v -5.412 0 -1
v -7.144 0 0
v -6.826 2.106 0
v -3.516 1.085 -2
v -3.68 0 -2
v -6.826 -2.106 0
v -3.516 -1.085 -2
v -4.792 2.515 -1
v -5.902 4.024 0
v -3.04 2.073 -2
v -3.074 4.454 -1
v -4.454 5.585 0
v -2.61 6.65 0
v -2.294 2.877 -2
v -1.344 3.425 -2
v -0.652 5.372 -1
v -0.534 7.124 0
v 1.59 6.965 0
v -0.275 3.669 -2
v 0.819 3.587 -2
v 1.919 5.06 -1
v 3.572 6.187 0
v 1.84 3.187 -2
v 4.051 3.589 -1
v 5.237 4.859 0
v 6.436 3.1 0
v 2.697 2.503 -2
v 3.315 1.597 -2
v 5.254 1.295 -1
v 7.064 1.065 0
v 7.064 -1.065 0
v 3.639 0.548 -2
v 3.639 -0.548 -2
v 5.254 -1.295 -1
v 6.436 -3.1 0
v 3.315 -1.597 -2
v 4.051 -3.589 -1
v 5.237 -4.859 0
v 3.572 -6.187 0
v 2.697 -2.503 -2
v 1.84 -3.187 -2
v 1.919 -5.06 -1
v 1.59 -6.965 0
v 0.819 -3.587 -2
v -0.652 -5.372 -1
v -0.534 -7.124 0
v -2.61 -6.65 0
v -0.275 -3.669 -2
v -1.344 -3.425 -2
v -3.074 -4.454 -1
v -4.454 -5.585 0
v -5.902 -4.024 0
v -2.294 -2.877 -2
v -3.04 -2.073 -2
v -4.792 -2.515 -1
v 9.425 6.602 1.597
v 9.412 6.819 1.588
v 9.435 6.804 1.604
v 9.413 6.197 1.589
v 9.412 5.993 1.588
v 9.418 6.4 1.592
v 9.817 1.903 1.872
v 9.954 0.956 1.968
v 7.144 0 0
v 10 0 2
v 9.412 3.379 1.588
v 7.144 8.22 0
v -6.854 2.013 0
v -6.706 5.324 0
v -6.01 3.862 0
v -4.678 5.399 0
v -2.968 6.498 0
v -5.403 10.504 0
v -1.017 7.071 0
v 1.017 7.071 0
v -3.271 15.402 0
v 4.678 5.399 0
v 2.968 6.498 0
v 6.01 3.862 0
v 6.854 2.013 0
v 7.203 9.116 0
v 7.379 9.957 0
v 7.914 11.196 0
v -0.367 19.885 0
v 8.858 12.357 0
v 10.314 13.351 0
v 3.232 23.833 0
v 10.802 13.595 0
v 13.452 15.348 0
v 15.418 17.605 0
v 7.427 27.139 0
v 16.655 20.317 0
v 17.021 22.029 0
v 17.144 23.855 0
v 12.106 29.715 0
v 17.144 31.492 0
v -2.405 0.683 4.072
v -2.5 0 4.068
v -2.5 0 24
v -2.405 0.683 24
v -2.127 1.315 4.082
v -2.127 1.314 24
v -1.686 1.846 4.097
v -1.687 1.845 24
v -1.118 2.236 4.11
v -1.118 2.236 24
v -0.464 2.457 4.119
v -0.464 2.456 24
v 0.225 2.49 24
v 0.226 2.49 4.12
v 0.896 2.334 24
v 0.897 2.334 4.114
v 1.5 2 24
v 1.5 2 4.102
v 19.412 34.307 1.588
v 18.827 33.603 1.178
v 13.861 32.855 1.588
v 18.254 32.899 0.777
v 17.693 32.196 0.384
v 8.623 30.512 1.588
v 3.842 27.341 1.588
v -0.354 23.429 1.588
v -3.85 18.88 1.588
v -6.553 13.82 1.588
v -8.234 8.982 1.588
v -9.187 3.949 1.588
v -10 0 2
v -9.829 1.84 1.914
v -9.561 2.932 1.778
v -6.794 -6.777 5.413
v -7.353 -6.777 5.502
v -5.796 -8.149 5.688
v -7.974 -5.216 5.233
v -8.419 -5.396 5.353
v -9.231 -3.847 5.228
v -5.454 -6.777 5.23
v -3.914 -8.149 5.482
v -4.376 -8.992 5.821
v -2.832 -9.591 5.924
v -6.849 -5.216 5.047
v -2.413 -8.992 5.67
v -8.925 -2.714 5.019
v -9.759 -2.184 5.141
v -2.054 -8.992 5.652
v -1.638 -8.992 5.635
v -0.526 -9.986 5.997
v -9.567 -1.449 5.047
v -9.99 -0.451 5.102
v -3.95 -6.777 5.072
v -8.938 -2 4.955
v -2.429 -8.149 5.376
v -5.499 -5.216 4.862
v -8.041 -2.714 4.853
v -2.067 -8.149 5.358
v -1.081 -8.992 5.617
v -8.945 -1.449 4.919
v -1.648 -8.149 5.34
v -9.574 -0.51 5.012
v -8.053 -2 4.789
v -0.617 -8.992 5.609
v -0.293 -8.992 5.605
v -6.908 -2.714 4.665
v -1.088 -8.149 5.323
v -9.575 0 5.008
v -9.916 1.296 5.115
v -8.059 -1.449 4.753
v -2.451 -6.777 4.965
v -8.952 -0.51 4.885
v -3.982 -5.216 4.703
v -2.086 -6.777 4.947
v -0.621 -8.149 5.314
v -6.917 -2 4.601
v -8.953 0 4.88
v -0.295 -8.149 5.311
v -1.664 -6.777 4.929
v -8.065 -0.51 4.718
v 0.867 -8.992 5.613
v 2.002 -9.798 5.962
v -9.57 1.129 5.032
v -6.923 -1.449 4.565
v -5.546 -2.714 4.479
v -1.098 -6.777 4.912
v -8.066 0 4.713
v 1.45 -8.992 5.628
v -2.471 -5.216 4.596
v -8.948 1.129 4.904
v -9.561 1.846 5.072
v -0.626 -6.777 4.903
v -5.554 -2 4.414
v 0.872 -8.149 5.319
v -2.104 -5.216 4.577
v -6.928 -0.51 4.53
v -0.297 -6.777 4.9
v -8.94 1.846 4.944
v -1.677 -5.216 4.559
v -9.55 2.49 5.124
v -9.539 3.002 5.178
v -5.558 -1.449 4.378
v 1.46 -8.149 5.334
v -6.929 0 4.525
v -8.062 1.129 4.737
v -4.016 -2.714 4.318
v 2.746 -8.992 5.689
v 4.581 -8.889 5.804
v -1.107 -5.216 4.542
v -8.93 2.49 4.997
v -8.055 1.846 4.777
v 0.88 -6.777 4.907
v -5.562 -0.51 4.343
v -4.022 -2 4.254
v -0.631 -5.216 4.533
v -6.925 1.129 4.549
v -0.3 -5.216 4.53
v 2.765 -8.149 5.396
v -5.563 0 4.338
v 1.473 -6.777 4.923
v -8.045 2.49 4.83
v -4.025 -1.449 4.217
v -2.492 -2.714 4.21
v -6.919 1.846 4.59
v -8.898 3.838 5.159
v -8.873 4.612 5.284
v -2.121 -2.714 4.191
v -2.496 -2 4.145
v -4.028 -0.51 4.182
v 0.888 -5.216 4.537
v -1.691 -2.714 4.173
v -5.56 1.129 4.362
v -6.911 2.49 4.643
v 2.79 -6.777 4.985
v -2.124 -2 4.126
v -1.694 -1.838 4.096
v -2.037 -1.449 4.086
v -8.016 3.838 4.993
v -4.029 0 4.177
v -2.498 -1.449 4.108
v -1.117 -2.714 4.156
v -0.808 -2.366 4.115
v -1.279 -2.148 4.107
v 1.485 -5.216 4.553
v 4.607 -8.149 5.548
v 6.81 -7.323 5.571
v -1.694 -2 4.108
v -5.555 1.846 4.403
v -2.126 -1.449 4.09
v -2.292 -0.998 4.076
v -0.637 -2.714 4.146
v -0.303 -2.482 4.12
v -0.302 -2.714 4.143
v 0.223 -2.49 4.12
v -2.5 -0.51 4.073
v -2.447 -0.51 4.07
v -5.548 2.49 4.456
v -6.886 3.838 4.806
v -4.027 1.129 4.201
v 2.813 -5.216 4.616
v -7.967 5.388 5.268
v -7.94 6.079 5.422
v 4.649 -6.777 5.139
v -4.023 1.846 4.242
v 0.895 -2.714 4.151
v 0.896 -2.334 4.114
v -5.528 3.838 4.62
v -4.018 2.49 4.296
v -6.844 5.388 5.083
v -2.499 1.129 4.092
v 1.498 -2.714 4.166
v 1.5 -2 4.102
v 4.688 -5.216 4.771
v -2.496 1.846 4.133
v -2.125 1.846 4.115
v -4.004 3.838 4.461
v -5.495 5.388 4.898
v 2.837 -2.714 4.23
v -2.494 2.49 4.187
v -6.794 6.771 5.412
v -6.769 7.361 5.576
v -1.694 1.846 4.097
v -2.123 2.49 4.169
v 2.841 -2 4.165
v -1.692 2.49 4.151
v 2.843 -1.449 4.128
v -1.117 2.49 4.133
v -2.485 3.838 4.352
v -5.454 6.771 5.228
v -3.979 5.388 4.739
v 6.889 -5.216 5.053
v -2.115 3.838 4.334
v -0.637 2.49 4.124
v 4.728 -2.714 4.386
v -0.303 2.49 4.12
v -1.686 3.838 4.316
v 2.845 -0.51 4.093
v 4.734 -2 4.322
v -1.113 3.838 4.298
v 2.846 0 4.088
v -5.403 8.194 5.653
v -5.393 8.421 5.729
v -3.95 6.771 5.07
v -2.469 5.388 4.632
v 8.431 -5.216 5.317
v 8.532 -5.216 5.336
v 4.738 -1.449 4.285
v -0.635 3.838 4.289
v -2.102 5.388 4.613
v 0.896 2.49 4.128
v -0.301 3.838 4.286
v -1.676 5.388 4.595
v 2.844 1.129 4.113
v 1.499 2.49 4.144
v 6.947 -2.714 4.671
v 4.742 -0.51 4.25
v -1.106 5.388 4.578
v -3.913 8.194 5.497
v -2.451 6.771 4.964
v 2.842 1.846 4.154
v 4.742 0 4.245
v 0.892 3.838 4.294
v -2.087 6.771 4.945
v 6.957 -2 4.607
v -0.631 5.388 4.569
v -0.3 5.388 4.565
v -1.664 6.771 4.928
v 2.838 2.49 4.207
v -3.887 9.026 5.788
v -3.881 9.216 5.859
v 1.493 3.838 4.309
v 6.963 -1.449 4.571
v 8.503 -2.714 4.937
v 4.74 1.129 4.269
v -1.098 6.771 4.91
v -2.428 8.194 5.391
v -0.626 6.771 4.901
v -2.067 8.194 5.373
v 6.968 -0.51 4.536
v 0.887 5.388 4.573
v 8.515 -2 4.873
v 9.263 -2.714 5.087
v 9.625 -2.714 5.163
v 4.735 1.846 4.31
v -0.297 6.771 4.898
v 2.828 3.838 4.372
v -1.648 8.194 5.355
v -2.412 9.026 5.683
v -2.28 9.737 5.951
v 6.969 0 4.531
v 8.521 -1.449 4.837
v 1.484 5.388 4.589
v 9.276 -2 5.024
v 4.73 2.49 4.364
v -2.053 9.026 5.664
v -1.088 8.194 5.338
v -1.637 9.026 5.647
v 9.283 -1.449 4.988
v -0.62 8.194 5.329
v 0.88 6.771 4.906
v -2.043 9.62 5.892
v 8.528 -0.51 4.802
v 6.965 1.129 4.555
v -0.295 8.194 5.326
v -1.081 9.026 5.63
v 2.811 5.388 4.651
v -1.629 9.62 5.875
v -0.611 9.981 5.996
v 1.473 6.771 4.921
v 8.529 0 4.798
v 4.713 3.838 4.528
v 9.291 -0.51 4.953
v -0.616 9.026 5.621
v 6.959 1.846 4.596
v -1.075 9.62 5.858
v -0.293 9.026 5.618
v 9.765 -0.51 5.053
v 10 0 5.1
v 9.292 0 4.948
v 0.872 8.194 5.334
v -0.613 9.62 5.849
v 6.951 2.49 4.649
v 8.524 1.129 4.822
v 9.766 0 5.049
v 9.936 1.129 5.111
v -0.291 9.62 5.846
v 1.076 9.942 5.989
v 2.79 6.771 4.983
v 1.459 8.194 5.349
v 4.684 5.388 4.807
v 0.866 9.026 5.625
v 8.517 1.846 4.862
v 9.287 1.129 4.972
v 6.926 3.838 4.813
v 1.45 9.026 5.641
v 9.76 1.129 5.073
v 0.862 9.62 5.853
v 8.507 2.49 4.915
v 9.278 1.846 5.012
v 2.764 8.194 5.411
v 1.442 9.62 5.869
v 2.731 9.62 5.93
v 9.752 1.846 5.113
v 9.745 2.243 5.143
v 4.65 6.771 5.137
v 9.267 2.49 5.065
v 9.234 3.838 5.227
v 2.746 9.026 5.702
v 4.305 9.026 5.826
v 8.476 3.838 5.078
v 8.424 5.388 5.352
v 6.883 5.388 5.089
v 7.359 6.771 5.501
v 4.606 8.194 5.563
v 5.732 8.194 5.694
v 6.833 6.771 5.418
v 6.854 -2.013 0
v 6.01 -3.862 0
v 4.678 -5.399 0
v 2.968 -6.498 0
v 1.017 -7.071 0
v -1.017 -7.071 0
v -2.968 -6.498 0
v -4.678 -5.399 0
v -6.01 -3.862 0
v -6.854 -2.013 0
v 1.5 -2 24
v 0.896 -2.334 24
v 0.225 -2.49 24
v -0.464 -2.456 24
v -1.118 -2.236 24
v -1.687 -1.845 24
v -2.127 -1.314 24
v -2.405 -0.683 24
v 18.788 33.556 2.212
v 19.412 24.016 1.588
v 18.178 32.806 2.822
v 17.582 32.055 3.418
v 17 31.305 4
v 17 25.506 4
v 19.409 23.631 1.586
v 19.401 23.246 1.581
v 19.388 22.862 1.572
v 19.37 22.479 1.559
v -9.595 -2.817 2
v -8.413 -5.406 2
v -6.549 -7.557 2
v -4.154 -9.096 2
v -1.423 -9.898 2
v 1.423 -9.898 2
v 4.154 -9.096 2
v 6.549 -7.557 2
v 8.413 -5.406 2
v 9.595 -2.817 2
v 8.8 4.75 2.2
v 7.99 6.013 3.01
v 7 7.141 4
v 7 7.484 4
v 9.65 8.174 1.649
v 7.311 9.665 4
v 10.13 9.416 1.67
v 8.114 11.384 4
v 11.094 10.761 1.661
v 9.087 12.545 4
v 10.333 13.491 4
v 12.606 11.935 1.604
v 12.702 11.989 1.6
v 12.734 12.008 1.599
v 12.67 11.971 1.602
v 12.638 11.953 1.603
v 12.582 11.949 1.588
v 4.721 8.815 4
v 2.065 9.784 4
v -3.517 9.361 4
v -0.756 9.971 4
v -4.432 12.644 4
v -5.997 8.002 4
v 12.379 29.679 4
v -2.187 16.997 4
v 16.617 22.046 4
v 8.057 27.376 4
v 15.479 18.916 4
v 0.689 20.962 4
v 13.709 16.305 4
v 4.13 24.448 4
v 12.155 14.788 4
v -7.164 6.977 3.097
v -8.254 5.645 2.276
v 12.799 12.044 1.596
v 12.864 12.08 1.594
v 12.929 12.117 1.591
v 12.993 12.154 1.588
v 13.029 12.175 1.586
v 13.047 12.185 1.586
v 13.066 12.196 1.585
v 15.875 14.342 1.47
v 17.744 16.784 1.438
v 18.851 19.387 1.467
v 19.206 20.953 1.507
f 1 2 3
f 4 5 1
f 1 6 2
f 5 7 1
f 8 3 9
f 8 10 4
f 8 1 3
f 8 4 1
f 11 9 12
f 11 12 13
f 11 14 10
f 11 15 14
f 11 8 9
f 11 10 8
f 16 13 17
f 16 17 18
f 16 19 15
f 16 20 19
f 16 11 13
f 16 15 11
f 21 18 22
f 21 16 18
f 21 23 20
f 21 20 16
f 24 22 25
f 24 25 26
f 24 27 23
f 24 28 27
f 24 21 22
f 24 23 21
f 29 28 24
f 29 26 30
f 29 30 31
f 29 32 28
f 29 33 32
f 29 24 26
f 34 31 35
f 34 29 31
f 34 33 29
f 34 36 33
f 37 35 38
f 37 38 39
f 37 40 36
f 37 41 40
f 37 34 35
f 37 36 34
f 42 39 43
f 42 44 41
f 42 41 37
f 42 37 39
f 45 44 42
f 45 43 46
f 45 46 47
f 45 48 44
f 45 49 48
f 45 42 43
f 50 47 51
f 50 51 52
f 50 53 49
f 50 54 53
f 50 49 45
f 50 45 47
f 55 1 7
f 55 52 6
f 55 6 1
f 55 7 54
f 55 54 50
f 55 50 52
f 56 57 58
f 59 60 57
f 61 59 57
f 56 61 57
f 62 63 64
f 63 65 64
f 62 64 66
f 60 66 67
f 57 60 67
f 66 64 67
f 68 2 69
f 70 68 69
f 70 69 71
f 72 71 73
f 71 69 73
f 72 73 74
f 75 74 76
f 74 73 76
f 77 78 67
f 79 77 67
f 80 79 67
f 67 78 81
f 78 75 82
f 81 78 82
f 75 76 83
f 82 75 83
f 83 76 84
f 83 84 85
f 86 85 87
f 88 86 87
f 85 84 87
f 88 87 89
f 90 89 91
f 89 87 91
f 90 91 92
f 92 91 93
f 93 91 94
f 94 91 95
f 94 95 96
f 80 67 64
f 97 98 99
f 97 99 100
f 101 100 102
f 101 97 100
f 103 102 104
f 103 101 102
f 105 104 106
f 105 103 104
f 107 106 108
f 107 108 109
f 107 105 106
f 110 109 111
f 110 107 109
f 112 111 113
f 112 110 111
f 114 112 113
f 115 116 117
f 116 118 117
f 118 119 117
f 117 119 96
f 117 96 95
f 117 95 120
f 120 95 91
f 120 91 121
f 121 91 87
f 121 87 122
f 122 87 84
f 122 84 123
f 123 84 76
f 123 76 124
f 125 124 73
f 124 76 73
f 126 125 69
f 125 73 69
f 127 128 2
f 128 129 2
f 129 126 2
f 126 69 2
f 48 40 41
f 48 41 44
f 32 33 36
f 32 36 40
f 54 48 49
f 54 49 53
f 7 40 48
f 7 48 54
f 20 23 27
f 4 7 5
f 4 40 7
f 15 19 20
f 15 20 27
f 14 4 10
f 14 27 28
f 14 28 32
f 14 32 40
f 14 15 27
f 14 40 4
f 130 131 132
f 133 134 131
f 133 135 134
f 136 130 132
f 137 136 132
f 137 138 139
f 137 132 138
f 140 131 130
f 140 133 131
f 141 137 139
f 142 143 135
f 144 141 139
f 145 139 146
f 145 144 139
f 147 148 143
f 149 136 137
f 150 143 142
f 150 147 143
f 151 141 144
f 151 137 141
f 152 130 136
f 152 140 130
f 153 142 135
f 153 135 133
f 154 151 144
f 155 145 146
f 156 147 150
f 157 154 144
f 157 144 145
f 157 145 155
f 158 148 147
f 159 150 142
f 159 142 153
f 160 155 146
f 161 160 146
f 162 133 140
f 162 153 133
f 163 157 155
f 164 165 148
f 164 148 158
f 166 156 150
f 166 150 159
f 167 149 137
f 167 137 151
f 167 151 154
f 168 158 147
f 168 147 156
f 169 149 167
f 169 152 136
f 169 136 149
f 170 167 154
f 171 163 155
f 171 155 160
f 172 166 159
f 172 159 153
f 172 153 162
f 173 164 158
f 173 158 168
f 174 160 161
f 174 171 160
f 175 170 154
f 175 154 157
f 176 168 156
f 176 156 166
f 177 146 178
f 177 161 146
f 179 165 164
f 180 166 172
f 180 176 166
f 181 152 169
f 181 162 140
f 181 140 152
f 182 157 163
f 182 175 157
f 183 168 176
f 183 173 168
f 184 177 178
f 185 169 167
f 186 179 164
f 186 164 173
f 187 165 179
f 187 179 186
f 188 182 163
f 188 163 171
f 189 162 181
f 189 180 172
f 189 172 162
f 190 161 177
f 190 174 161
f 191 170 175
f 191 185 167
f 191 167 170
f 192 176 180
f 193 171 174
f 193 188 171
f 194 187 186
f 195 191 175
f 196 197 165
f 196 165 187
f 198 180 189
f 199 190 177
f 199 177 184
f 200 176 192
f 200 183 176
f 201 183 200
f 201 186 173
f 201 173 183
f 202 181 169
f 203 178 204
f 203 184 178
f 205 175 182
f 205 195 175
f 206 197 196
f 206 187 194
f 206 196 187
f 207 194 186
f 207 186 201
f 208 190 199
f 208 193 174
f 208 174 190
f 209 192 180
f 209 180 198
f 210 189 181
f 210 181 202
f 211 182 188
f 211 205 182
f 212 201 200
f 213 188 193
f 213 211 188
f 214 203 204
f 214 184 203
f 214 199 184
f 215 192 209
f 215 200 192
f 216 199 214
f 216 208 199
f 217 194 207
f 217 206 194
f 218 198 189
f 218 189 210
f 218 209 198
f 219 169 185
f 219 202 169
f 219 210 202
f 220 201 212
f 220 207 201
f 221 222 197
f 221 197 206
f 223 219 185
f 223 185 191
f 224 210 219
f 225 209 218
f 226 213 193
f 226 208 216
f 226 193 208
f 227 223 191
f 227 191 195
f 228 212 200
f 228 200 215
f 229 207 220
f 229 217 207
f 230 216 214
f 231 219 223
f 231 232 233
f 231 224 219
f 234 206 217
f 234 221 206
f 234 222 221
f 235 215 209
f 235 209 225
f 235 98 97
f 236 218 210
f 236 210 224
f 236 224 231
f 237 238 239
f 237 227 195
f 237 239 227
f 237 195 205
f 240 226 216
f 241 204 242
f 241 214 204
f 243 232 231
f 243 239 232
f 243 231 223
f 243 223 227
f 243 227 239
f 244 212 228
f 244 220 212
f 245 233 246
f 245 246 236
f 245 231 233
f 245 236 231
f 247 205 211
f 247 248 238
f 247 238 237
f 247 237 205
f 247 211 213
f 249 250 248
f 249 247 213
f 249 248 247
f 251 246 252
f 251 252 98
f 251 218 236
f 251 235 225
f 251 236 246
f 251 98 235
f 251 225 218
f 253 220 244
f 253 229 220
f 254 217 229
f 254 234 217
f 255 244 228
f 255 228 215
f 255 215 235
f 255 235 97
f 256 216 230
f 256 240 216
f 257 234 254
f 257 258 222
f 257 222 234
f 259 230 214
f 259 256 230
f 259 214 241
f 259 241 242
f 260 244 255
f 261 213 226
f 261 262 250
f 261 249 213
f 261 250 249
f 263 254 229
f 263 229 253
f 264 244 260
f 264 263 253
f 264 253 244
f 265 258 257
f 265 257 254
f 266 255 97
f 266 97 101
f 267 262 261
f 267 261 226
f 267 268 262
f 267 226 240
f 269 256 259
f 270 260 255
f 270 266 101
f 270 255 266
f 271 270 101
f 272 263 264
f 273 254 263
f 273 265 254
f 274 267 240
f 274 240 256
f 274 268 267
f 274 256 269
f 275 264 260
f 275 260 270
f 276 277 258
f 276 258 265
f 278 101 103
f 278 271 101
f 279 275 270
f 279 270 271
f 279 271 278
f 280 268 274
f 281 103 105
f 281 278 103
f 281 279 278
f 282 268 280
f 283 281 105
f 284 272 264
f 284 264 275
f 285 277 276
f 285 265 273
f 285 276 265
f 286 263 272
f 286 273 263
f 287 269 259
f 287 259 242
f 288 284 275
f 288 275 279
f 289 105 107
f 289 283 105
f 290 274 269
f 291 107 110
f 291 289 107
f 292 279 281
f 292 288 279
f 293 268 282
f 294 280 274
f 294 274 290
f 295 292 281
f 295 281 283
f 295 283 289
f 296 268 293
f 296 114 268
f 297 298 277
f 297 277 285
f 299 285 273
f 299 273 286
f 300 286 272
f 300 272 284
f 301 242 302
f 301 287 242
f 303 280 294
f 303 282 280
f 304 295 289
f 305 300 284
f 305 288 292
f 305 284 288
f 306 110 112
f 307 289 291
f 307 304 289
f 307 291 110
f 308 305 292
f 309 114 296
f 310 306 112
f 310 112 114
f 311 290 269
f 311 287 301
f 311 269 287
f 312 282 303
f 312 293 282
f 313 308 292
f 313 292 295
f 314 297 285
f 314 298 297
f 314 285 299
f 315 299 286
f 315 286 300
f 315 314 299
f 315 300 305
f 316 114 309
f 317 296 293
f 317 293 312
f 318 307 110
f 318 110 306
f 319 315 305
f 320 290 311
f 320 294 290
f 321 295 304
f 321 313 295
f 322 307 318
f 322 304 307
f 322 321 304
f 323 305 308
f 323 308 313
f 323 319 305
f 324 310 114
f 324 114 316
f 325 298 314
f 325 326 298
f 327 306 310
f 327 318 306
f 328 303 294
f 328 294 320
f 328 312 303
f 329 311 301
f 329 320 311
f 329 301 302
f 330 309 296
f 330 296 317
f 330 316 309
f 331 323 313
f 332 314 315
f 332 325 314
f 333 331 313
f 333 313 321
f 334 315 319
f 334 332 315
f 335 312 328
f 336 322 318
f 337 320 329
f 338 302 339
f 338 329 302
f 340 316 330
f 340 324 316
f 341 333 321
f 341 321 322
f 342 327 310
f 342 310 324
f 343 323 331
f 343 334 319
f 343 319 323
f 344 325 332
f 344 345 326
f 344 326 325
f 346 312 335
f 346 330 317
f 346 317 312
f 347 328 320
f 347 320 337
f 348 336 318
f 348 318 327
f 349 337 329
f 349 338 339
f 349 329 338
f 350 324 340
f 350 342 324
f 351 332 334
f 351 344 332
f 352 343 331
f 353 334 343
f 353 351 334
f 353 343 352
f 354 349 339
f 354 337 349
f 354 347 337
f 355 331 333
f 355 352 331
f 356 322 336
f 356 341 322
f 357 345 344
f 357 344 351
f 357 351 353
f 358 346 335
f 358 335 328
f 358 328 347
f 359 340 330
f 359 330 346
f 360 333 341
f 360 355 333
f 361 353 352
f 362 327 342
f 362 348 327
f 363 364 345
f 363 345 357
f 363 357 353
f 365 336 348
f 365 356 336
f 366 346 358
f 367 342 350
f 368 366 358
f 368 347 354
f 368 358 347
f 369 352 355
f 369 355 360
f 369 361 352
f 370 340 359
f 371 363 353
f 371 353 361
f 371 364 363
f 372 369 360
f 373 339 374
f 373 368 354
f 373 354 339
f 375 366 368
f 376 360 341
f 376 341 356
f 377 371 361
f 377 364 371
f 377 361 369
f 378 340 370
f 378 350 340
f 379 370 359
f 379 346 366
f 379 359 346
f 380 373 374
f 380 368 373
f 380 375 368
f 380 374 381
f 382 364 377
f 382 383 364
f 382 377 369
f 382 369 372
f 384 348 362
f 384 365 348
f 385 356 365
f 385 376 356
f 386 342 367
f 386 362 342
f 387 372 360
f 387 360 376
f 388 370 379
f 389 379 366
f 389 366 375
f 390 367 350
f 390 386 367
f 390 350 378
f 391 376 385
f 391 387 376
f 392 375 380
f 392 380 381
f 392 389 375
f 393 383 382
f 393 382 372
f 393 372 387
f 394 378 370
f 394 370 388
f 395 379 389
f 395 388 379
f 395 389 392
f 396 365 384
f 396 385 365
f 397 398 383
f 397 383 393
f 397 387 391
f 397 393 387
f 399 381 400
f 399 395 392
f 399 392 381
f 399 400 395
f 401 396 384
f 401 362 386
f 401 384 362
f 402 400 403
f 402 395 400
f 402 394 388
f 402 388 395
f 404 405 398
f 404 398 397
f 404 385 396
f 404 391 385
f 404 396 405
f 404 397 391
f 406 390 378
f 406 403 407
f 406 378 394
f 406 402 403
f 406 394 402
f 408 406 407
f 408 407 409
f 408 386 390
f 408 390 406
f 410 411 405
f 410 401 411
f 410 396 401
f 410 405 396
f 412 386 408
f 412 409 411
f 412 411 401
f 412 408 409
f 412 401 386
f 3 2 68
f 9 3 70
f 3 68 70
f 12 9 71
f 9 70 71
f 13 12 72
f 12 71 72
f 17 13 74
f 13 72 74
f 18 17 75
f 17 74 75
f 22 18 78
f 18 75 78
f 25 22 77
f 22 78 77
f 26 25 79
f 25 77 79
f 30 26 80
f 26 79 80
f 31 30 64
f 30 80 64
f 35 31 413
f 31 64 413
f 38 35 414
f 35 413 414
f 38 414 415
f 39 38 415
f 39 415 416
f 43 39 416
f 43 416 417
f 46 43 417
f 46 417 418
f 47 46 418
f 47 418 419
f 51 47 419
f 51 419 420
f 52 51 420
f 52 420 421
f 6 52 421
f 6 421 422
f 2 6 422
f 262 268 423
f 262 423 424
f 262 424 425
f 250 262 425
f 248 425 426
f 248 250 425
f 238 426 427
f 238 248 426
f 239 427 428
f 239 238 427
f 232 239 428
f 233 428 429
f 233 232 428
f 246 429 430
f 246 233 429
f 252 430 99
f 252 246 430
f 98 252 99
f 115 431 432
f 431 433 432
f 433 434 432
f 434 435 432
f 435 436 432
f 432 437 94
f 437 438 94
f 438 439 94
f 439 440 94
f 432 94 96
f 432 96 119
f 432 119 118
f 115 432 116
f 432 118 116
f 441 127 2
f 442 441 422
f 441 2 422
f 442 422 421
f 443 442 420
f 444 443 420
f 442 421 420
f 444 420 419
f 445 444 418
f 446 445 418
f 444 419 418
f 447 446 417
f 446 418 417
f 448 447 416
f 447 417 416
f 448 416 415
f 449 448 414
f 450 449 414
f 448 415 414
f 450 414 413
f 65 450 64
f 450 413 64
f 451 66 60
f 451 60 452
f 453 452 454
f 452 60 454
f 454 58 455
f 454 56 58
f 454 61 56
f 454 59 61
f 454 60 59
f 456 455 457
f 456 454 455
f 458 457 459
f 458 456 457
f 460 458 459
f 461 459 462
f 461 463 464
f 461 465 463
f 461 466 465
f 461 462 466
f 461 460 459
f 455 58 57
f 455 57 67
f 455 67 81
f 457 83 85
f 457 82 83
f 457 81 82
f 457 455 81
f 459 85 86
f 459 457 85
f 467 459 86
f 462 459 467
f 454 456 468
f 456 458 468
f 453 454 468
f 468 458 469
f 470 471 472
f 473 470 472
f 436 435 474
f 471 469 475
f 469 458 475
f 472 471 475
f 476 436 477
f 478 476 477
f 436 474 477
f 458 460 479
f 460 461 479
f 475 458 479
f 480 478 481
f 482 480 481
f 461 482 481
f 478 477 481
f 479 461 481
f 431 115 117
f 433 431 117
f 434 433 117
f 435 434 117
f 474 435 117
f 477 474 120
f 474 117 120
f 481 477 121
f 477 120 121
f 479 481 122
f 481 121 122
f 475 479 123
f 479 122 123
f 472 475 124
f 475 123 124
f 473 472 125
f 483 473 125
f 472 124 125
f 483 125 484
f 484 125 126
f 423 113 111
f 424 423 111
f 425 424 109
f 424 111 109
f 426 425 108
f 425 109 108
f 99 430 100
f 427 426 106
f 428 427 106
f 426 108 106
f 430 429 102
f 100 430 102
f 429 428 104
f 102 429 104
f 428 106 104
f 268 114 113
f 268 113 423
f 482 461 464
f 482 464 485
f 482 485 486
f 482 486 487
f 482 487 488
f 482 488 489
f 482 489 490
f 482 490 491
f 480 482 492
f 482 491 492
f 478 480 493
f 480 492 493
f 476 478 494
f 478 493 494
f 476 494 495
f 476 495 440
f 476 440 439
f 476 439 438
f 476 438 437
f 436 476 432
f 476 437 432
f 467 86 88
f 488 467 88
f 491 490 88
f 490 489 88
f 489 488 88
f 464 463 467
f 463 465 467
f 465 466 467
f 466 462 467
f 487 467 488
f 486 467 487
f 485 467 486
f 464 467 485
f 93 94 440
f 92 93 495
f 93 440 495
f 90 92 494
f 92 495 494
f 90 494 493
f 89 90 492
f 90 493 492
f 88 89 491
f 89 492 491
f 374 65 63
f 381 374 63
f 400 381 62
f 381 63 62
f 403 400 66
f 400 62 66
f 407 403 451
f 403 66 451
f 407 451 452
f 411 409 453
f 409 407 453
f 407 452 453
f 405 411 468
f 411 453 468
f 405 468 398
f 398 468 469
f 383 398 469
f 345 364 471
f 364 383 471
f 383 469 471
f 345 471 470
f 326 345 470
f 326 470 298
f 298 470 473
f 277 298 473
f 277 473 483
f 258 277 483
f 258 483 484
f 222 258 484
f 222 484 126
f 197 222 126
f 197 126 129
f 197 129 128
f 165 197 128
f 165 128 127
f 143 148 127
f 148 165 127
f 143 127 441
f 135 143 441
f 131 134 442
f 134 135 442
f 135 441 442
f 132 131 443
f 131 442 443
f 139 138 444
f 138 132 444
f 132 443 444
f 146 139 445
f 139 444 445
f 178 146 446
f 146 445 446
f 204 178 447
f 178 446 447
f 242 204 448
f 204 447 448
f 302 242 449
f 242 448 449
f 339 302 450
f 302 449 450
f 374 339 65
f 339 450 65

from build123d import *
from OCP.BRepFilletAPI import BRepFilletAPI_MakeChamfer
from build123d.topology import SkipClean

# Parameters (mm, degrees)
SKETCH1_R           = 10
BOSS_EXTRUDE1_DEPTH = 4
CHAMFER1_SIZE       = 2
CHAMFER1_SIZE2      = 2.856296013
SKETCH3_R           = 10
BOSS_EXTRUDE2_DEPTH = 2
CHAMFER2_SIZE       = 3
BOSS_EXTRUDE3_DEPTH = 24
SKETCH6_R           = 7.143703987
BOSS_EXTRUDE4_DEPTH = 2
CHAMFER3_SIZE2      = 3.464101615
CHAMFER3_SIZE       = 2
FILLET1_R           = 10
FILLET2_R           = 20


# Some blends are built 0.0001 mm under size
with BuildPart() as part:
    # Sketch1 → Boss-Extrude1 (new body)
    with BuildSketch(Plane.XY):
        with BuildLine():
            ThreePointArc((-10, 0), (0, 10), (10, 0))
            Line((10, 0), (10, 10))
            Line((10, 10), (20, 15))
            Line((20, 15), (20, 35))
            ThreePointArc((20, 35), (-1.473671334, 23.048861143), (-10, 0))
        make_face()
        Circle(SKETCH1_R)
    extrude(amount=BOSS_EXTRUDE1_DEPTH)

    # Chamfer1: one chamfer whose edges measure the first distance from different faces: ONE call of the kernel's chamfer builder (chamfer() names one face for all edges)
    chamfer1_edges_1 = [part.edges().sort_by_distance(p)[0] for p in [
        (20, 25, 0),
    ]]
    chamfer1_side_1 = [part.faces().sort_by_distance(p)[0] for p in [
        (20, 25, 2),
    ]]
    chamfer1_edges_2 = [part.edges().sort_by_distance(p)[0] for p in [
        (15, 12.5, 0),
    ]]
    chamfer1_side_2 = [part.faces().sort_by_distance(p)[0] for p in [
        (15, 12.5, 2),
    ]]
    chamfer1_edges_3 = [part.edges().sort_by_distance(p)[0] for p in [
        (10, 5, 0),
    ]]
    chamfer1_side_3 = [part.faces().sort_by_distance(p)[0] for p in [
        (10, 5, 2),
    ]]
    chamfer1_edges_4 = [part.edges().sort_by_distance(p)[0] for p in [
        (0, -10, 0),
    ]]
    chamfer1_side_4 = [part.faces().sort_by_distance(p)[0] for p in [
        (0, -10, 2),
    ]]
    chamfer1_edges_5 = [part.edges().sort_by_distance(p)[0] for p in [
        (-1.473671334, 23.048861143, 0),
    ]]
    chamfer1_side_5 = [part.faces().sort_by_distance(p)[0] for p in [
        (-1.473671334, 23.048861143, 2),
    ]]
    chamfer1 = BRepFilletAPI_MakeChamfer(part.part.solid().wrapped)
    for e in chamfer1_edges_1:
        chamfer1.Add(CHAMFER1_SIZE, CHAMFER1_SIZE2, e.wrapped, chamfer1_side_1[0].wrapped)  # the first distance lies on this face
    for e in chamfer1_edges_2:
        chamfer1.Add(CHAMFER1_SIZE, CHAMFER1_SIZE2, e.wrapped, chamfer1_side_2[0].wrapped)  # the first distance lies on this face
    for e in chamfer1_edges_3:
        chamfer1.Add(CHAMFER1_SIZE, CHAMFER1_SIZE2, e.wrapped, chamfer1_side_3[0].wrapped)  # the first distance lies on this face
    for e in chamfer1_edges_4:
        chamfer1.Add(CHAMFER1_SIZE, CHAMFER1_SIZE2, e.wrapped, chamfer1_side_4[0].wrapped)  # the first distance lies on this face
    for e in chamfer1_edges_5:
        chamfer1.Add(CHAMFER1_SIZE, CHAMFER1_SIZE2, e.wrapped, chamfer1_side_5[0].wrapped)  # the first distance lies on this face
    add(Compound.cast(chamfer1.Shape()), mode=Mode.REPLACE)

    # Sketch3 → Boss-Extrude2 (add)
    with BuildSketch(Plane.XY.offset(4)):
        Circle(SKETCH3_R)
    extrude(amount=BOSS_EXTRUDE2_DEPTH)

    # Sketch4 → Cut-Revolve2 (revolve, cut)
    with SkipClean():  # the faces are left unmerged after this step: merging them gives an invalid solid
        with BuildSketch(Plane(origin=(0, 0, 0), x_dir=(0, 0, -1), z_dir=(1, 0, 0))):
            with BuildLine():
                Line((-50, 16.613247726), (-50, -16.613247726))
                ThreePointArc((-50, -16.613247726), (-4, 0), (-50, 16.613247726))
            make_face()
        revolve(axis=Axis((0, 16.613247726, 50), (0, -1, 0)), mode=Mode.SUBTRACT)

    # Chamfer2
    # the kernel refuses this chamfer: 3 mm, written as the material it takes off along each edge
    with BuildSketch(Plane(origin=(10, -7.715048964, 4), x_dir=(0, 0, -1), z_dir=(0, 1, 0))) as chamfer2_piece_1_section:
        Polygon((CHAMFER2_SIZE, 0), (0, CHAMFER2_SIZE), (0, 0), align=None)
    chamfer2_piece_1 = extrude(amount=25.430097928, mode=Mode.PRIVATE)
    chamfer2_piece_1 = chamfer2_piece_1 - Plane(origin=(0, 0, 4), x_dir=(1, 0, 0), z_dir=(0, 0, -1)) * Cylinder(10, 63, mode=Mode.PRIVATE)
    chamfer2_piece_1 = split(chamfer2_piece_1, bisect_by=Plane(origin=(5.786169814, 0.712611408, -5.422410742), z_dir=(0.316227766016838, -0.6324555320336757, 0.7071067811865477)), keep=Keep.TOP, mode=Mode.PRIVATE)
    add(chamfer2_piece_1, mode=Mode.SUBTRACT)
    with BuildSketch(Plane(origin=(3.099450427, 6.549725213, 4), x_dir=(-0.4472135954999581, 0.8944271909999159, 0), z_dir=(0.8944271909999159, 0.4472135954999581, 0))) as chamfer2_piece_2_section:
        Polygon((CHAMFER2_SIZE, 0), (0, -CHAMFER2_SIZE), (0, 0), align=None)
    chamfer2_piece_2 = extrude(amount=26.610437815, mode=Mode.PRIVATE)
    chamfer2_piece_2 = split(chamfer2_piece_2, bisect_by=Plane(origin=(5.049725213, 6.549725213, 5.950274787), z_dir=(0.7071067811865476, 0, 0.7071067811865476)), keep=Keep.TOP, mode=Mode.PRIVATE)
    add(chamfer2_piece_2, mode=Mode.SUBTRACT)
    with BuildSketch(Plane(origin=(20, 7.284951036, 4), x_dir=(-1, 0, 0), z_dir=(0, 1, 0))) as chamfer2_piece_3:
        Polygon((CHAMFER2_SIZE, 0), (0, -CHAMFER2_SIZE), (0, 0), align=None)
    extrude(amount=35.430097928, mode=Mode.SUBTRACT)
    with BuildSketch(Plane(origin=(25.416666667, 0, 4), x_dir=(0.06431969440635008, 0.9979293446489453, 0), z_dir=(0.9979293446489453, -0.06431969440635008, 0))) as chamfer2_piece_4_section:
        Polygon((35.416666667 - CHAMFER2_SIZE, 0), (35.416666667, -CHAMFER2_SIZE), (35.416666667, 0), align=None)
    chamfer2_piece_4 = revolve(axis=Axis((25.416666667, 0, 4), (0, 0, 1)), revolution_arc=114.912638668, mode=Mode.PRIVATE)
    chamfer2_piece_4 = chamfer2_piece_4 - Plane(origin=(0, 0, 4), x_dir=(1, 0, 0), z_dir=(0, 0, -1)) * Cylinder(10, 142, mode=Mode.PRIVATE)
    add(chamfer2_piece_4, mode=Mode.SUBTRACT)

    # Sketch5 → Boss-Extrude3 (add)
    with BuildSketch(Plane(origin=(0, 0, 0), x_dir=(-1, 0, 0), z_dir=(0, 0, -1))):
        with BuildLine():
            ThreePointArc((2.5, 0), (1.118033989, 2.236067977), (-1.5, 2))
            Line((-1.5, 2), (-1.5, -2))
            ThreePointArc((-1.5, -2), (1.118033989, -2.236067977), (2.5, 0))
        make_face()
    extrude(amount=-BOSS_EXTRUDE3_DEPTH)

    # Sketch6 → Boss-Extrude4 (add)
    with BuildSketch(Plane(origin=(0, 0, 0), x_dir=(-1, 0, 0), z_dir=(0, 0, -1))):
        Circle(SKETCH6_R)
    extrude(amount=BOSS_EXTRUDE4_DEPTH)

    # Chamfer3
    chamfer3_edges = [part.edges().sort_by_distance(p)[0] for p in [
        (7.143703987, 0, -2),
    ]]
    chamfer3_side = [part.faces().sort_by_distance(p)[0] for p in [
        (7.143703987, 0, -1.96),
    ]]
    chamfer(chamfer3_edges, length=CHAMFER3_SIZE - 0.0001, length2=CHAMFER3_SIZE2 - 0.0001, reference=chamfer3_side[0])  # a hair under: the kernel refuses the full size

    # Fillet1
    # the kernel refuses this fillet: 10 mm, written as the material it adds along each edge
    with BuildSketch(Plane(origin=(15.19031869, 6.792206637, 5.634300272), x_dir=(-0.36999358405013405, -0.8921806391504057, -0.25907229664113096), z_dir=(-0.7308315944351151, 0.4516787654131792, -0.5117337915852868))) as fillet1_piece_1_section:
        with BuildLine():
            CenterArc((FILLET1_R * 0.316268876392, -FILLET1_R), FILLET1_R, 90, 35.101083815)
            Line((-FILLET1_R * 0.258751851785, -FILLET1_R * 0.181861159602), (0, 0))
            Line((0, 0), (FILLET1_R * 0.316268876392, 0))
        make_face()
    fillet1_piece_1 = extrude(amount=18.916939263, mode=Mode.PRIVATE)
    fillet1_piece_1 = split(fillet1_piece_1, bisect_by=Plane(origin=(10.278009209, 6.792206637, 0.721990791), z_dir=(0.7071067811865476, 0, 0.7071067811865476)), keep=Keep.TOP, mode=Mode.PRIVATE)
    fillet1_piece_1 = split(fillet1_piece_1, bisect_by=Plane(origin=(12.993467105, 11.185909808, 0.721990791), z_dir=(-0.31622776601683794, 0.6324555320336759, -0.7071067811865477)), keep=Keep.TOP, mode=Mode.PRIVATE)
    add(fillet1_piece_1)
    with BuildSketch(Plane(origin=(15.19031869, 6.792206637, 5.634300272), x_dir=(-0.36999358405013405, -0.8921806391504057, -0.25907229664113096), z_dir=(-0.7308315944351151, 0.4516787654131792, -0.5117337915852868))) as fillet1_piece_2_section:
        with BuildLine():
            CenterArc((FILLET1_R * 0.316268876392, -FILLET1_R), FILLET1_R, 90, 35.101083815)
            Line((-FILLET1_R * 0.258751851785, -FILLET1_R * 0.181861159602), (0, 0))
            Line((0, 0), (FILLET1_R * 0.316268876392, 0))
        make_face()
    fillet1_piece_2 = extrude(amount=18.916939263, mode=Mode.PRIVATE)
    fillet1_piece_2 = split(fillet1_piece_2, bisect_by=Plane(origin=(10.278009209, 6.792206637, 0.721990791), z_dir=(-0.7071067811865476, 0, -0.7071067811865476)), keep=Keep.TOP, mode=Mode.PRIVATE)
    fillet1_piece_2 = split(fillet1_piece_2, bisect_by=Plane(origin=(12.993467105, 11.185909808, 0.721990791), z_dir=(0.31622776601683794, -0.6324555320336759, 0.7071067811865477)), keep=Keep.TOP, mode=Mode.PRIVATE)
    add(fillet1_piece_2)
    with BuildSketch(Plane(origin=(15.19031869, 6.792206637, 5.634300272), x_dir=(-0.36999358405013405, -0.8921806391504057, -0.25907229664113096), z_dir=(-0.7308315944351151, 0.4516787654131792, -0.5117337915852868))) as fillet1_piece_3_section:
        with BuildLine():
            CenterArc((FILLET1_R * 0.316268876392, -FILLET1_R), FILLET1_R, 90, 35.101083815)
            Line((-FILLET1_R * 0.258751851785, -FILLET1_R * 0.181861159602), (0, 0))
            Line((0, 0), (FILLET1_R * 0.316268876392, 0))
        make_face()
    fillet1_piece_3 = extrude(amount=18.916939263, mode=Mode.PRIVATE)
    fillet1_piece_3 = split(fillet1_piece_3, bisect_by=Plane(origin=(15.19031869, 6.792206637, 0), z_dir=(0, 0, 1)), keep=Keep.TOP, mode=Mode.PRIVATE)
    fillet1_piece_3 = split(fillet1_piece_3, bisect_by=Plane(origin=(10.278009209, 6.792206637, 0.721990791), z_dir=(-0.7071067811865476, 0, -0.7071067811865476)), keep=Keep.TOP, mode=Mode.PRIVATE)
    fillet1_piece_3 = split(fillet1_piece_3, bisect_by=Plane(origin=(12.993467105, 11.185909808, 0.721990791), z_dir=(-0.31622776601683794, 0.6324555320336759, -0.7071067811865477)), keep=Keep.TOP, mode=Mode.PRIVATE)
    add(fillet1_piece_3)
    with BuildSketch(Plane(origin=(0.513404622, 15.863038381, 10.486595378), x_dir=(-0.28315848617955147, -0.9163201096827513, 0.283158486179551), z_dir=(0.6479361632942746, -0.40044657145615603, -0.6479361632942746))) as fillet1_piece_4_section:
        with BuildLine():
            CenterArc((FILLET1_R * 0.400446571456, -FILLET1_R), FILLET1_R, 90, 43.646927109)
            Line((-FILLET1_R * 0.289765861241, -FILLET1_R * 0.27639320225), (0, 0))
            Line((0, 0), (FILLET1_R * 0.400446571456, 0))
        make_face()
    fillet1_piece_4 = extrude(amount=23.744665195, mode=Mode.PRIVATE)
    fillet1_piece_4 = split(fillet1_piece_4, bisect_by=Plane(origin=(7.621794482, 15.863038381, 0.334762569), z_dir=(-0.5735764363510445, 0, 0.819152044288993)), keep=Keep.TOP, mode=Mode.PRIVATE)
    fillet1_piece_4 = split(fillet1_piece_4, bisect_by=Plane(origin=(3.692373209, 9.505101206, 0.334762569), z_dir=(-0.2565111803946036, 0.5130223607892069, 0.8191520442889928)), keep=Keep.TOP, mode=Mode.PRIVATE)
    fillet1_piece_4 = split(fillet1_piece_4, bisect_by=Plane(origin=(0.513404622, 15.863038381, 4), z_dir=(0, 0, -1)), keep=Keep.TOP, mode=Mode.PRIVATE)
    add(fillet1_piece_4)
    with BuildSketch(Plane(origin=(0.513404622, 15.863038381, 10.486595378), x_dir=(-0.28315848617955147, -0.9163201096827513, 0.283158486179551), z_dir=(0.6479361632942746, -0.40044657145615603, -0.6479361632942746))) as fillet1_piece_5_section:
        with BuildLine():
            CenterArc((FILLET1_R * 0.400446571456, -FILLET1_R), FILLET1_R, 90, 43.646927109)
            Line((-FILLET1_R * 0.289765861241, -FILLET1_R * 0.27639320225), (0, 0))
            Line((0, 0), (FILLET1_R * 0.400446571456, 0))
        make_face()
    fillet1_piece_5 = extrude(amount=23.744665195, mode=Mode.PRIVATE)
    fillet1_piece_5 = split(fillet1_piece_5, bisect_by=Plane(origin=(7.621794482, 15.863038381, 0.334762569), z_dir=(0.5735764363510445, 0, -0.819152044288993)), keep=Keep.TOP, mode=Mode.PRIVATE)
    fillet1_piece_5 = split(fillet1_piece_5, bisect_by=Plane(origin=(3.692373209, 9.505101206, 0.334762569), z_dir=(-0.2565111803946036, 0.5130223607892069, 0.8191520442889928)), keep=Keep.TOP, mode=Mode.PRIVATE)
    add(fillet1_piece_5)
    with BuildSketch(Plane(origin=(0.513404622, 15.863038381, 10.486595378), x_dir=(-0.28315848617955147, -0.9163201096827513, 0.283158486179551), z_dir=(0.6479361632942746, -0.40044657145615603, -0.6479361632942746))) as fillet1_piece_6_section:
        with BuildLine():
            CenterArc((FILLET1_R * 0.400446571456, -FILLET1_R), FILLET1_R, 90, 43.646927109)
            Line((-FILLET1_R * 0.289765861241, -FILLET1_R * 0.27639320225), (0, 0))
            Line((0, 0), (FILLET1_R * 0.400446571456, 0))
        make_face()
    fillet1_piece_6 = extrude(amount=23.744665195, mode=Mode.PRIVATE)
    fillet1_piece_6 = split(fillet1_piece_6, bisect_by=Plane(origin=(7.621794482, 15.863038381, 0.334762569), z_dir=(-0.5735764363510445, 0, 0.819152044288993)), keep=Keep.TOP, mode=Mode.PRIVATE)
    fillet1_piece_6 = split(fillet1_piece_6, bisect_by=Plane(origin=(3.692373209, 9.505101206, 0.334762569), z_dir=(0.2565111803946036, -0.5130223607892069, -0.8191520442889928)), keep=Keep.TOP, mode=Mode.PRIVATE)
    add(fillet1_piece_6)
    with BuildSketch(Plane(origin=(15.19031869, 6.792206637, 5.634300272), x_dir=(-0.36999358405013405, -0.8921806391504057, -0.25907229664113096), z_dir=(-0.7308315944351151, 0.4516787654131792, -0.5117337915852868))) as fillet1_piece_7a_section:
        with BuildLine():
            CenterArc((FILLET1_R * 0.316268876392, -FILLET1_R), FILLET1_R, 90, 35.101083815)
            Line((-FILLET1_R * 0.258751851785, -FILLET1_R * 0.181861159602), (0, 0))
            Line((0, 0), (FILLET1_R * 0.316268876392, 0))
        make_face()
    fillet1_piece_7a = extrude(amount=18.916939263, mode=Mode.PRIVATE)
    fillet1_piece_7a = split(fillet1_piece_7a, bisect_by=Plane(origin=(10.278009209, 6.792206637, 0.721990791), z_dir=(0.7071067811865476, 0, 0.7071067811865476)), keep=Keep.TOP, mode=Mode.PRIVATE)
    fillet1_piece_7a = split(fillet1_piece_7a, bisect_by=Plane(origin=(12.993467105, 11.185909808, 0.721990791), z_dir=(0.31622776601683794, -0.6324555320336759, 0.7071067811865477)), keep=Keep.TOP, mode=Mode.PRIVATE)
    with BuildSketch(Plane(origin=(0.513404622, 15.863038381, 10.486595378), x_dir=(-0.28315848617955147, -0.9163201096827513, 0.283158486179551), z_dir=(0.6479361632942746, -0.40044657145615603, -0.6479361632942746))) as fillet1_piece_7b_section:
        with BuildLine():
            CenterArc((FILLET1_R * 0.400446571456, -FILLET1_R), FILLET1_R, 90, 43.646927109)
            Line((-FILLET1_R * 0.289765861241, -FILLET1_R * 0.27639320225), (0, 0))
            Line((0, 0), (FILLET1_R * 0.400446571456, 0))
        make_face()
    fillet1_piece_7b = extrude(amount=23.744665195, mode=Mode.PRIVATE)
    fillet1_piece_7b = split(fillet1_piece_7b, bisect_by=Plane(origin=(7.621794482, 15.863038381, 0.334762569), z_dir=(0.5735764363510445, 0, -0.819152044288993)), keep=Keep.TOP, mode=Mode.PRIVATE)
    fillet1_piece_7b = split(fillet1_piece_7b, bisect_by=Plane(origin=(3.692373209, 9.505101206, 0.334762569), z_dir=(0.2565111803946036, -0.5130223607892069, -0.8191520442889928)), keep=Keep.TOP, mode=Mode.PRIVATE)
    fillet1_piece_7 = fillet1_piece_7a & fillet1_piece_7b
    add(fillet1_piece_7)

    # Fillet2
    # the kernel refuses this fillet: 20 mm, written as the material it takes off along each edge
    with BuildSketch(Plane(origin=(30.96880087, 8.220908247, 9.680437054), x_dir=(-0.6325244619050064, -0.7299276335395035, 0.2590722966416945), z_dir=(-0.7308315944351149, 0.4516787654131793, -0.5117337915852869))) as fillet2_piece_1:
        with BuildLine():
            CenterArc((FILLET2_R * 0.316268876392, FILLET2_R), FILLET2_R, 234.898916185, 35.101083815)
            Line((-FILLET2_R * 0.258751851784, FILLET2_R * 0.181861159603), (-FILLET2_R * 0.270252266348, FILLET2_R * 0.165498382795))
            Line((-FILLET2_R * 0.270252266348, FILLET2_R * 0.165498382795), (-FILLET2_R * 0.00632537752785, -FILLET2_R * 0.02))
            Line((-FILLET2_R * 0.00632537752785, -FILLET2_R * 0.02), (FILLET2_R * 0.316268876391, -FILLET2_R * 0.02))
            Line((FILLET2_R * 0.316268876391, -FILLET2_R * 0.02), (FILLET2_R * 0.316268876391, 0))
        make_face()
    extrude(amount=34.730383082, mode=Mode.SUBTRACT)
    with BuildSketch(Plane(origin=(32.254343694, 7.426399087, -11.254343694), x_dir=(0.28315848617949646, 0.9163201096827853, -0.2831584861794967), z_dir=(-0.6479361632942986, 0.40044657145607865, 0.6479361632942986))) as fillet2_piece_2:
        with BuildLine():
            CenterArc((7.92825461, 20), FILLET2_R, 229.844556223, 40.155443777)
            Line((-4.96901588, 4.714045208), (-6.258742929, 3.185449729))
            ThreePointArc((-6.258742929, 3.185449729), (-5.895951663, 2.859922194), (-1.380424865, -1.447213595))
            Line((-1.380424865, -1.447213595), (0, -2))
            Line((0, -2), (7.92825461, -2))
            Line((7.92825461, -2), (7.92825461, 0))
        make_face()
    extrude(amount=43.363609674, mode=Mode.SUBTRACT)


solid = part.part
